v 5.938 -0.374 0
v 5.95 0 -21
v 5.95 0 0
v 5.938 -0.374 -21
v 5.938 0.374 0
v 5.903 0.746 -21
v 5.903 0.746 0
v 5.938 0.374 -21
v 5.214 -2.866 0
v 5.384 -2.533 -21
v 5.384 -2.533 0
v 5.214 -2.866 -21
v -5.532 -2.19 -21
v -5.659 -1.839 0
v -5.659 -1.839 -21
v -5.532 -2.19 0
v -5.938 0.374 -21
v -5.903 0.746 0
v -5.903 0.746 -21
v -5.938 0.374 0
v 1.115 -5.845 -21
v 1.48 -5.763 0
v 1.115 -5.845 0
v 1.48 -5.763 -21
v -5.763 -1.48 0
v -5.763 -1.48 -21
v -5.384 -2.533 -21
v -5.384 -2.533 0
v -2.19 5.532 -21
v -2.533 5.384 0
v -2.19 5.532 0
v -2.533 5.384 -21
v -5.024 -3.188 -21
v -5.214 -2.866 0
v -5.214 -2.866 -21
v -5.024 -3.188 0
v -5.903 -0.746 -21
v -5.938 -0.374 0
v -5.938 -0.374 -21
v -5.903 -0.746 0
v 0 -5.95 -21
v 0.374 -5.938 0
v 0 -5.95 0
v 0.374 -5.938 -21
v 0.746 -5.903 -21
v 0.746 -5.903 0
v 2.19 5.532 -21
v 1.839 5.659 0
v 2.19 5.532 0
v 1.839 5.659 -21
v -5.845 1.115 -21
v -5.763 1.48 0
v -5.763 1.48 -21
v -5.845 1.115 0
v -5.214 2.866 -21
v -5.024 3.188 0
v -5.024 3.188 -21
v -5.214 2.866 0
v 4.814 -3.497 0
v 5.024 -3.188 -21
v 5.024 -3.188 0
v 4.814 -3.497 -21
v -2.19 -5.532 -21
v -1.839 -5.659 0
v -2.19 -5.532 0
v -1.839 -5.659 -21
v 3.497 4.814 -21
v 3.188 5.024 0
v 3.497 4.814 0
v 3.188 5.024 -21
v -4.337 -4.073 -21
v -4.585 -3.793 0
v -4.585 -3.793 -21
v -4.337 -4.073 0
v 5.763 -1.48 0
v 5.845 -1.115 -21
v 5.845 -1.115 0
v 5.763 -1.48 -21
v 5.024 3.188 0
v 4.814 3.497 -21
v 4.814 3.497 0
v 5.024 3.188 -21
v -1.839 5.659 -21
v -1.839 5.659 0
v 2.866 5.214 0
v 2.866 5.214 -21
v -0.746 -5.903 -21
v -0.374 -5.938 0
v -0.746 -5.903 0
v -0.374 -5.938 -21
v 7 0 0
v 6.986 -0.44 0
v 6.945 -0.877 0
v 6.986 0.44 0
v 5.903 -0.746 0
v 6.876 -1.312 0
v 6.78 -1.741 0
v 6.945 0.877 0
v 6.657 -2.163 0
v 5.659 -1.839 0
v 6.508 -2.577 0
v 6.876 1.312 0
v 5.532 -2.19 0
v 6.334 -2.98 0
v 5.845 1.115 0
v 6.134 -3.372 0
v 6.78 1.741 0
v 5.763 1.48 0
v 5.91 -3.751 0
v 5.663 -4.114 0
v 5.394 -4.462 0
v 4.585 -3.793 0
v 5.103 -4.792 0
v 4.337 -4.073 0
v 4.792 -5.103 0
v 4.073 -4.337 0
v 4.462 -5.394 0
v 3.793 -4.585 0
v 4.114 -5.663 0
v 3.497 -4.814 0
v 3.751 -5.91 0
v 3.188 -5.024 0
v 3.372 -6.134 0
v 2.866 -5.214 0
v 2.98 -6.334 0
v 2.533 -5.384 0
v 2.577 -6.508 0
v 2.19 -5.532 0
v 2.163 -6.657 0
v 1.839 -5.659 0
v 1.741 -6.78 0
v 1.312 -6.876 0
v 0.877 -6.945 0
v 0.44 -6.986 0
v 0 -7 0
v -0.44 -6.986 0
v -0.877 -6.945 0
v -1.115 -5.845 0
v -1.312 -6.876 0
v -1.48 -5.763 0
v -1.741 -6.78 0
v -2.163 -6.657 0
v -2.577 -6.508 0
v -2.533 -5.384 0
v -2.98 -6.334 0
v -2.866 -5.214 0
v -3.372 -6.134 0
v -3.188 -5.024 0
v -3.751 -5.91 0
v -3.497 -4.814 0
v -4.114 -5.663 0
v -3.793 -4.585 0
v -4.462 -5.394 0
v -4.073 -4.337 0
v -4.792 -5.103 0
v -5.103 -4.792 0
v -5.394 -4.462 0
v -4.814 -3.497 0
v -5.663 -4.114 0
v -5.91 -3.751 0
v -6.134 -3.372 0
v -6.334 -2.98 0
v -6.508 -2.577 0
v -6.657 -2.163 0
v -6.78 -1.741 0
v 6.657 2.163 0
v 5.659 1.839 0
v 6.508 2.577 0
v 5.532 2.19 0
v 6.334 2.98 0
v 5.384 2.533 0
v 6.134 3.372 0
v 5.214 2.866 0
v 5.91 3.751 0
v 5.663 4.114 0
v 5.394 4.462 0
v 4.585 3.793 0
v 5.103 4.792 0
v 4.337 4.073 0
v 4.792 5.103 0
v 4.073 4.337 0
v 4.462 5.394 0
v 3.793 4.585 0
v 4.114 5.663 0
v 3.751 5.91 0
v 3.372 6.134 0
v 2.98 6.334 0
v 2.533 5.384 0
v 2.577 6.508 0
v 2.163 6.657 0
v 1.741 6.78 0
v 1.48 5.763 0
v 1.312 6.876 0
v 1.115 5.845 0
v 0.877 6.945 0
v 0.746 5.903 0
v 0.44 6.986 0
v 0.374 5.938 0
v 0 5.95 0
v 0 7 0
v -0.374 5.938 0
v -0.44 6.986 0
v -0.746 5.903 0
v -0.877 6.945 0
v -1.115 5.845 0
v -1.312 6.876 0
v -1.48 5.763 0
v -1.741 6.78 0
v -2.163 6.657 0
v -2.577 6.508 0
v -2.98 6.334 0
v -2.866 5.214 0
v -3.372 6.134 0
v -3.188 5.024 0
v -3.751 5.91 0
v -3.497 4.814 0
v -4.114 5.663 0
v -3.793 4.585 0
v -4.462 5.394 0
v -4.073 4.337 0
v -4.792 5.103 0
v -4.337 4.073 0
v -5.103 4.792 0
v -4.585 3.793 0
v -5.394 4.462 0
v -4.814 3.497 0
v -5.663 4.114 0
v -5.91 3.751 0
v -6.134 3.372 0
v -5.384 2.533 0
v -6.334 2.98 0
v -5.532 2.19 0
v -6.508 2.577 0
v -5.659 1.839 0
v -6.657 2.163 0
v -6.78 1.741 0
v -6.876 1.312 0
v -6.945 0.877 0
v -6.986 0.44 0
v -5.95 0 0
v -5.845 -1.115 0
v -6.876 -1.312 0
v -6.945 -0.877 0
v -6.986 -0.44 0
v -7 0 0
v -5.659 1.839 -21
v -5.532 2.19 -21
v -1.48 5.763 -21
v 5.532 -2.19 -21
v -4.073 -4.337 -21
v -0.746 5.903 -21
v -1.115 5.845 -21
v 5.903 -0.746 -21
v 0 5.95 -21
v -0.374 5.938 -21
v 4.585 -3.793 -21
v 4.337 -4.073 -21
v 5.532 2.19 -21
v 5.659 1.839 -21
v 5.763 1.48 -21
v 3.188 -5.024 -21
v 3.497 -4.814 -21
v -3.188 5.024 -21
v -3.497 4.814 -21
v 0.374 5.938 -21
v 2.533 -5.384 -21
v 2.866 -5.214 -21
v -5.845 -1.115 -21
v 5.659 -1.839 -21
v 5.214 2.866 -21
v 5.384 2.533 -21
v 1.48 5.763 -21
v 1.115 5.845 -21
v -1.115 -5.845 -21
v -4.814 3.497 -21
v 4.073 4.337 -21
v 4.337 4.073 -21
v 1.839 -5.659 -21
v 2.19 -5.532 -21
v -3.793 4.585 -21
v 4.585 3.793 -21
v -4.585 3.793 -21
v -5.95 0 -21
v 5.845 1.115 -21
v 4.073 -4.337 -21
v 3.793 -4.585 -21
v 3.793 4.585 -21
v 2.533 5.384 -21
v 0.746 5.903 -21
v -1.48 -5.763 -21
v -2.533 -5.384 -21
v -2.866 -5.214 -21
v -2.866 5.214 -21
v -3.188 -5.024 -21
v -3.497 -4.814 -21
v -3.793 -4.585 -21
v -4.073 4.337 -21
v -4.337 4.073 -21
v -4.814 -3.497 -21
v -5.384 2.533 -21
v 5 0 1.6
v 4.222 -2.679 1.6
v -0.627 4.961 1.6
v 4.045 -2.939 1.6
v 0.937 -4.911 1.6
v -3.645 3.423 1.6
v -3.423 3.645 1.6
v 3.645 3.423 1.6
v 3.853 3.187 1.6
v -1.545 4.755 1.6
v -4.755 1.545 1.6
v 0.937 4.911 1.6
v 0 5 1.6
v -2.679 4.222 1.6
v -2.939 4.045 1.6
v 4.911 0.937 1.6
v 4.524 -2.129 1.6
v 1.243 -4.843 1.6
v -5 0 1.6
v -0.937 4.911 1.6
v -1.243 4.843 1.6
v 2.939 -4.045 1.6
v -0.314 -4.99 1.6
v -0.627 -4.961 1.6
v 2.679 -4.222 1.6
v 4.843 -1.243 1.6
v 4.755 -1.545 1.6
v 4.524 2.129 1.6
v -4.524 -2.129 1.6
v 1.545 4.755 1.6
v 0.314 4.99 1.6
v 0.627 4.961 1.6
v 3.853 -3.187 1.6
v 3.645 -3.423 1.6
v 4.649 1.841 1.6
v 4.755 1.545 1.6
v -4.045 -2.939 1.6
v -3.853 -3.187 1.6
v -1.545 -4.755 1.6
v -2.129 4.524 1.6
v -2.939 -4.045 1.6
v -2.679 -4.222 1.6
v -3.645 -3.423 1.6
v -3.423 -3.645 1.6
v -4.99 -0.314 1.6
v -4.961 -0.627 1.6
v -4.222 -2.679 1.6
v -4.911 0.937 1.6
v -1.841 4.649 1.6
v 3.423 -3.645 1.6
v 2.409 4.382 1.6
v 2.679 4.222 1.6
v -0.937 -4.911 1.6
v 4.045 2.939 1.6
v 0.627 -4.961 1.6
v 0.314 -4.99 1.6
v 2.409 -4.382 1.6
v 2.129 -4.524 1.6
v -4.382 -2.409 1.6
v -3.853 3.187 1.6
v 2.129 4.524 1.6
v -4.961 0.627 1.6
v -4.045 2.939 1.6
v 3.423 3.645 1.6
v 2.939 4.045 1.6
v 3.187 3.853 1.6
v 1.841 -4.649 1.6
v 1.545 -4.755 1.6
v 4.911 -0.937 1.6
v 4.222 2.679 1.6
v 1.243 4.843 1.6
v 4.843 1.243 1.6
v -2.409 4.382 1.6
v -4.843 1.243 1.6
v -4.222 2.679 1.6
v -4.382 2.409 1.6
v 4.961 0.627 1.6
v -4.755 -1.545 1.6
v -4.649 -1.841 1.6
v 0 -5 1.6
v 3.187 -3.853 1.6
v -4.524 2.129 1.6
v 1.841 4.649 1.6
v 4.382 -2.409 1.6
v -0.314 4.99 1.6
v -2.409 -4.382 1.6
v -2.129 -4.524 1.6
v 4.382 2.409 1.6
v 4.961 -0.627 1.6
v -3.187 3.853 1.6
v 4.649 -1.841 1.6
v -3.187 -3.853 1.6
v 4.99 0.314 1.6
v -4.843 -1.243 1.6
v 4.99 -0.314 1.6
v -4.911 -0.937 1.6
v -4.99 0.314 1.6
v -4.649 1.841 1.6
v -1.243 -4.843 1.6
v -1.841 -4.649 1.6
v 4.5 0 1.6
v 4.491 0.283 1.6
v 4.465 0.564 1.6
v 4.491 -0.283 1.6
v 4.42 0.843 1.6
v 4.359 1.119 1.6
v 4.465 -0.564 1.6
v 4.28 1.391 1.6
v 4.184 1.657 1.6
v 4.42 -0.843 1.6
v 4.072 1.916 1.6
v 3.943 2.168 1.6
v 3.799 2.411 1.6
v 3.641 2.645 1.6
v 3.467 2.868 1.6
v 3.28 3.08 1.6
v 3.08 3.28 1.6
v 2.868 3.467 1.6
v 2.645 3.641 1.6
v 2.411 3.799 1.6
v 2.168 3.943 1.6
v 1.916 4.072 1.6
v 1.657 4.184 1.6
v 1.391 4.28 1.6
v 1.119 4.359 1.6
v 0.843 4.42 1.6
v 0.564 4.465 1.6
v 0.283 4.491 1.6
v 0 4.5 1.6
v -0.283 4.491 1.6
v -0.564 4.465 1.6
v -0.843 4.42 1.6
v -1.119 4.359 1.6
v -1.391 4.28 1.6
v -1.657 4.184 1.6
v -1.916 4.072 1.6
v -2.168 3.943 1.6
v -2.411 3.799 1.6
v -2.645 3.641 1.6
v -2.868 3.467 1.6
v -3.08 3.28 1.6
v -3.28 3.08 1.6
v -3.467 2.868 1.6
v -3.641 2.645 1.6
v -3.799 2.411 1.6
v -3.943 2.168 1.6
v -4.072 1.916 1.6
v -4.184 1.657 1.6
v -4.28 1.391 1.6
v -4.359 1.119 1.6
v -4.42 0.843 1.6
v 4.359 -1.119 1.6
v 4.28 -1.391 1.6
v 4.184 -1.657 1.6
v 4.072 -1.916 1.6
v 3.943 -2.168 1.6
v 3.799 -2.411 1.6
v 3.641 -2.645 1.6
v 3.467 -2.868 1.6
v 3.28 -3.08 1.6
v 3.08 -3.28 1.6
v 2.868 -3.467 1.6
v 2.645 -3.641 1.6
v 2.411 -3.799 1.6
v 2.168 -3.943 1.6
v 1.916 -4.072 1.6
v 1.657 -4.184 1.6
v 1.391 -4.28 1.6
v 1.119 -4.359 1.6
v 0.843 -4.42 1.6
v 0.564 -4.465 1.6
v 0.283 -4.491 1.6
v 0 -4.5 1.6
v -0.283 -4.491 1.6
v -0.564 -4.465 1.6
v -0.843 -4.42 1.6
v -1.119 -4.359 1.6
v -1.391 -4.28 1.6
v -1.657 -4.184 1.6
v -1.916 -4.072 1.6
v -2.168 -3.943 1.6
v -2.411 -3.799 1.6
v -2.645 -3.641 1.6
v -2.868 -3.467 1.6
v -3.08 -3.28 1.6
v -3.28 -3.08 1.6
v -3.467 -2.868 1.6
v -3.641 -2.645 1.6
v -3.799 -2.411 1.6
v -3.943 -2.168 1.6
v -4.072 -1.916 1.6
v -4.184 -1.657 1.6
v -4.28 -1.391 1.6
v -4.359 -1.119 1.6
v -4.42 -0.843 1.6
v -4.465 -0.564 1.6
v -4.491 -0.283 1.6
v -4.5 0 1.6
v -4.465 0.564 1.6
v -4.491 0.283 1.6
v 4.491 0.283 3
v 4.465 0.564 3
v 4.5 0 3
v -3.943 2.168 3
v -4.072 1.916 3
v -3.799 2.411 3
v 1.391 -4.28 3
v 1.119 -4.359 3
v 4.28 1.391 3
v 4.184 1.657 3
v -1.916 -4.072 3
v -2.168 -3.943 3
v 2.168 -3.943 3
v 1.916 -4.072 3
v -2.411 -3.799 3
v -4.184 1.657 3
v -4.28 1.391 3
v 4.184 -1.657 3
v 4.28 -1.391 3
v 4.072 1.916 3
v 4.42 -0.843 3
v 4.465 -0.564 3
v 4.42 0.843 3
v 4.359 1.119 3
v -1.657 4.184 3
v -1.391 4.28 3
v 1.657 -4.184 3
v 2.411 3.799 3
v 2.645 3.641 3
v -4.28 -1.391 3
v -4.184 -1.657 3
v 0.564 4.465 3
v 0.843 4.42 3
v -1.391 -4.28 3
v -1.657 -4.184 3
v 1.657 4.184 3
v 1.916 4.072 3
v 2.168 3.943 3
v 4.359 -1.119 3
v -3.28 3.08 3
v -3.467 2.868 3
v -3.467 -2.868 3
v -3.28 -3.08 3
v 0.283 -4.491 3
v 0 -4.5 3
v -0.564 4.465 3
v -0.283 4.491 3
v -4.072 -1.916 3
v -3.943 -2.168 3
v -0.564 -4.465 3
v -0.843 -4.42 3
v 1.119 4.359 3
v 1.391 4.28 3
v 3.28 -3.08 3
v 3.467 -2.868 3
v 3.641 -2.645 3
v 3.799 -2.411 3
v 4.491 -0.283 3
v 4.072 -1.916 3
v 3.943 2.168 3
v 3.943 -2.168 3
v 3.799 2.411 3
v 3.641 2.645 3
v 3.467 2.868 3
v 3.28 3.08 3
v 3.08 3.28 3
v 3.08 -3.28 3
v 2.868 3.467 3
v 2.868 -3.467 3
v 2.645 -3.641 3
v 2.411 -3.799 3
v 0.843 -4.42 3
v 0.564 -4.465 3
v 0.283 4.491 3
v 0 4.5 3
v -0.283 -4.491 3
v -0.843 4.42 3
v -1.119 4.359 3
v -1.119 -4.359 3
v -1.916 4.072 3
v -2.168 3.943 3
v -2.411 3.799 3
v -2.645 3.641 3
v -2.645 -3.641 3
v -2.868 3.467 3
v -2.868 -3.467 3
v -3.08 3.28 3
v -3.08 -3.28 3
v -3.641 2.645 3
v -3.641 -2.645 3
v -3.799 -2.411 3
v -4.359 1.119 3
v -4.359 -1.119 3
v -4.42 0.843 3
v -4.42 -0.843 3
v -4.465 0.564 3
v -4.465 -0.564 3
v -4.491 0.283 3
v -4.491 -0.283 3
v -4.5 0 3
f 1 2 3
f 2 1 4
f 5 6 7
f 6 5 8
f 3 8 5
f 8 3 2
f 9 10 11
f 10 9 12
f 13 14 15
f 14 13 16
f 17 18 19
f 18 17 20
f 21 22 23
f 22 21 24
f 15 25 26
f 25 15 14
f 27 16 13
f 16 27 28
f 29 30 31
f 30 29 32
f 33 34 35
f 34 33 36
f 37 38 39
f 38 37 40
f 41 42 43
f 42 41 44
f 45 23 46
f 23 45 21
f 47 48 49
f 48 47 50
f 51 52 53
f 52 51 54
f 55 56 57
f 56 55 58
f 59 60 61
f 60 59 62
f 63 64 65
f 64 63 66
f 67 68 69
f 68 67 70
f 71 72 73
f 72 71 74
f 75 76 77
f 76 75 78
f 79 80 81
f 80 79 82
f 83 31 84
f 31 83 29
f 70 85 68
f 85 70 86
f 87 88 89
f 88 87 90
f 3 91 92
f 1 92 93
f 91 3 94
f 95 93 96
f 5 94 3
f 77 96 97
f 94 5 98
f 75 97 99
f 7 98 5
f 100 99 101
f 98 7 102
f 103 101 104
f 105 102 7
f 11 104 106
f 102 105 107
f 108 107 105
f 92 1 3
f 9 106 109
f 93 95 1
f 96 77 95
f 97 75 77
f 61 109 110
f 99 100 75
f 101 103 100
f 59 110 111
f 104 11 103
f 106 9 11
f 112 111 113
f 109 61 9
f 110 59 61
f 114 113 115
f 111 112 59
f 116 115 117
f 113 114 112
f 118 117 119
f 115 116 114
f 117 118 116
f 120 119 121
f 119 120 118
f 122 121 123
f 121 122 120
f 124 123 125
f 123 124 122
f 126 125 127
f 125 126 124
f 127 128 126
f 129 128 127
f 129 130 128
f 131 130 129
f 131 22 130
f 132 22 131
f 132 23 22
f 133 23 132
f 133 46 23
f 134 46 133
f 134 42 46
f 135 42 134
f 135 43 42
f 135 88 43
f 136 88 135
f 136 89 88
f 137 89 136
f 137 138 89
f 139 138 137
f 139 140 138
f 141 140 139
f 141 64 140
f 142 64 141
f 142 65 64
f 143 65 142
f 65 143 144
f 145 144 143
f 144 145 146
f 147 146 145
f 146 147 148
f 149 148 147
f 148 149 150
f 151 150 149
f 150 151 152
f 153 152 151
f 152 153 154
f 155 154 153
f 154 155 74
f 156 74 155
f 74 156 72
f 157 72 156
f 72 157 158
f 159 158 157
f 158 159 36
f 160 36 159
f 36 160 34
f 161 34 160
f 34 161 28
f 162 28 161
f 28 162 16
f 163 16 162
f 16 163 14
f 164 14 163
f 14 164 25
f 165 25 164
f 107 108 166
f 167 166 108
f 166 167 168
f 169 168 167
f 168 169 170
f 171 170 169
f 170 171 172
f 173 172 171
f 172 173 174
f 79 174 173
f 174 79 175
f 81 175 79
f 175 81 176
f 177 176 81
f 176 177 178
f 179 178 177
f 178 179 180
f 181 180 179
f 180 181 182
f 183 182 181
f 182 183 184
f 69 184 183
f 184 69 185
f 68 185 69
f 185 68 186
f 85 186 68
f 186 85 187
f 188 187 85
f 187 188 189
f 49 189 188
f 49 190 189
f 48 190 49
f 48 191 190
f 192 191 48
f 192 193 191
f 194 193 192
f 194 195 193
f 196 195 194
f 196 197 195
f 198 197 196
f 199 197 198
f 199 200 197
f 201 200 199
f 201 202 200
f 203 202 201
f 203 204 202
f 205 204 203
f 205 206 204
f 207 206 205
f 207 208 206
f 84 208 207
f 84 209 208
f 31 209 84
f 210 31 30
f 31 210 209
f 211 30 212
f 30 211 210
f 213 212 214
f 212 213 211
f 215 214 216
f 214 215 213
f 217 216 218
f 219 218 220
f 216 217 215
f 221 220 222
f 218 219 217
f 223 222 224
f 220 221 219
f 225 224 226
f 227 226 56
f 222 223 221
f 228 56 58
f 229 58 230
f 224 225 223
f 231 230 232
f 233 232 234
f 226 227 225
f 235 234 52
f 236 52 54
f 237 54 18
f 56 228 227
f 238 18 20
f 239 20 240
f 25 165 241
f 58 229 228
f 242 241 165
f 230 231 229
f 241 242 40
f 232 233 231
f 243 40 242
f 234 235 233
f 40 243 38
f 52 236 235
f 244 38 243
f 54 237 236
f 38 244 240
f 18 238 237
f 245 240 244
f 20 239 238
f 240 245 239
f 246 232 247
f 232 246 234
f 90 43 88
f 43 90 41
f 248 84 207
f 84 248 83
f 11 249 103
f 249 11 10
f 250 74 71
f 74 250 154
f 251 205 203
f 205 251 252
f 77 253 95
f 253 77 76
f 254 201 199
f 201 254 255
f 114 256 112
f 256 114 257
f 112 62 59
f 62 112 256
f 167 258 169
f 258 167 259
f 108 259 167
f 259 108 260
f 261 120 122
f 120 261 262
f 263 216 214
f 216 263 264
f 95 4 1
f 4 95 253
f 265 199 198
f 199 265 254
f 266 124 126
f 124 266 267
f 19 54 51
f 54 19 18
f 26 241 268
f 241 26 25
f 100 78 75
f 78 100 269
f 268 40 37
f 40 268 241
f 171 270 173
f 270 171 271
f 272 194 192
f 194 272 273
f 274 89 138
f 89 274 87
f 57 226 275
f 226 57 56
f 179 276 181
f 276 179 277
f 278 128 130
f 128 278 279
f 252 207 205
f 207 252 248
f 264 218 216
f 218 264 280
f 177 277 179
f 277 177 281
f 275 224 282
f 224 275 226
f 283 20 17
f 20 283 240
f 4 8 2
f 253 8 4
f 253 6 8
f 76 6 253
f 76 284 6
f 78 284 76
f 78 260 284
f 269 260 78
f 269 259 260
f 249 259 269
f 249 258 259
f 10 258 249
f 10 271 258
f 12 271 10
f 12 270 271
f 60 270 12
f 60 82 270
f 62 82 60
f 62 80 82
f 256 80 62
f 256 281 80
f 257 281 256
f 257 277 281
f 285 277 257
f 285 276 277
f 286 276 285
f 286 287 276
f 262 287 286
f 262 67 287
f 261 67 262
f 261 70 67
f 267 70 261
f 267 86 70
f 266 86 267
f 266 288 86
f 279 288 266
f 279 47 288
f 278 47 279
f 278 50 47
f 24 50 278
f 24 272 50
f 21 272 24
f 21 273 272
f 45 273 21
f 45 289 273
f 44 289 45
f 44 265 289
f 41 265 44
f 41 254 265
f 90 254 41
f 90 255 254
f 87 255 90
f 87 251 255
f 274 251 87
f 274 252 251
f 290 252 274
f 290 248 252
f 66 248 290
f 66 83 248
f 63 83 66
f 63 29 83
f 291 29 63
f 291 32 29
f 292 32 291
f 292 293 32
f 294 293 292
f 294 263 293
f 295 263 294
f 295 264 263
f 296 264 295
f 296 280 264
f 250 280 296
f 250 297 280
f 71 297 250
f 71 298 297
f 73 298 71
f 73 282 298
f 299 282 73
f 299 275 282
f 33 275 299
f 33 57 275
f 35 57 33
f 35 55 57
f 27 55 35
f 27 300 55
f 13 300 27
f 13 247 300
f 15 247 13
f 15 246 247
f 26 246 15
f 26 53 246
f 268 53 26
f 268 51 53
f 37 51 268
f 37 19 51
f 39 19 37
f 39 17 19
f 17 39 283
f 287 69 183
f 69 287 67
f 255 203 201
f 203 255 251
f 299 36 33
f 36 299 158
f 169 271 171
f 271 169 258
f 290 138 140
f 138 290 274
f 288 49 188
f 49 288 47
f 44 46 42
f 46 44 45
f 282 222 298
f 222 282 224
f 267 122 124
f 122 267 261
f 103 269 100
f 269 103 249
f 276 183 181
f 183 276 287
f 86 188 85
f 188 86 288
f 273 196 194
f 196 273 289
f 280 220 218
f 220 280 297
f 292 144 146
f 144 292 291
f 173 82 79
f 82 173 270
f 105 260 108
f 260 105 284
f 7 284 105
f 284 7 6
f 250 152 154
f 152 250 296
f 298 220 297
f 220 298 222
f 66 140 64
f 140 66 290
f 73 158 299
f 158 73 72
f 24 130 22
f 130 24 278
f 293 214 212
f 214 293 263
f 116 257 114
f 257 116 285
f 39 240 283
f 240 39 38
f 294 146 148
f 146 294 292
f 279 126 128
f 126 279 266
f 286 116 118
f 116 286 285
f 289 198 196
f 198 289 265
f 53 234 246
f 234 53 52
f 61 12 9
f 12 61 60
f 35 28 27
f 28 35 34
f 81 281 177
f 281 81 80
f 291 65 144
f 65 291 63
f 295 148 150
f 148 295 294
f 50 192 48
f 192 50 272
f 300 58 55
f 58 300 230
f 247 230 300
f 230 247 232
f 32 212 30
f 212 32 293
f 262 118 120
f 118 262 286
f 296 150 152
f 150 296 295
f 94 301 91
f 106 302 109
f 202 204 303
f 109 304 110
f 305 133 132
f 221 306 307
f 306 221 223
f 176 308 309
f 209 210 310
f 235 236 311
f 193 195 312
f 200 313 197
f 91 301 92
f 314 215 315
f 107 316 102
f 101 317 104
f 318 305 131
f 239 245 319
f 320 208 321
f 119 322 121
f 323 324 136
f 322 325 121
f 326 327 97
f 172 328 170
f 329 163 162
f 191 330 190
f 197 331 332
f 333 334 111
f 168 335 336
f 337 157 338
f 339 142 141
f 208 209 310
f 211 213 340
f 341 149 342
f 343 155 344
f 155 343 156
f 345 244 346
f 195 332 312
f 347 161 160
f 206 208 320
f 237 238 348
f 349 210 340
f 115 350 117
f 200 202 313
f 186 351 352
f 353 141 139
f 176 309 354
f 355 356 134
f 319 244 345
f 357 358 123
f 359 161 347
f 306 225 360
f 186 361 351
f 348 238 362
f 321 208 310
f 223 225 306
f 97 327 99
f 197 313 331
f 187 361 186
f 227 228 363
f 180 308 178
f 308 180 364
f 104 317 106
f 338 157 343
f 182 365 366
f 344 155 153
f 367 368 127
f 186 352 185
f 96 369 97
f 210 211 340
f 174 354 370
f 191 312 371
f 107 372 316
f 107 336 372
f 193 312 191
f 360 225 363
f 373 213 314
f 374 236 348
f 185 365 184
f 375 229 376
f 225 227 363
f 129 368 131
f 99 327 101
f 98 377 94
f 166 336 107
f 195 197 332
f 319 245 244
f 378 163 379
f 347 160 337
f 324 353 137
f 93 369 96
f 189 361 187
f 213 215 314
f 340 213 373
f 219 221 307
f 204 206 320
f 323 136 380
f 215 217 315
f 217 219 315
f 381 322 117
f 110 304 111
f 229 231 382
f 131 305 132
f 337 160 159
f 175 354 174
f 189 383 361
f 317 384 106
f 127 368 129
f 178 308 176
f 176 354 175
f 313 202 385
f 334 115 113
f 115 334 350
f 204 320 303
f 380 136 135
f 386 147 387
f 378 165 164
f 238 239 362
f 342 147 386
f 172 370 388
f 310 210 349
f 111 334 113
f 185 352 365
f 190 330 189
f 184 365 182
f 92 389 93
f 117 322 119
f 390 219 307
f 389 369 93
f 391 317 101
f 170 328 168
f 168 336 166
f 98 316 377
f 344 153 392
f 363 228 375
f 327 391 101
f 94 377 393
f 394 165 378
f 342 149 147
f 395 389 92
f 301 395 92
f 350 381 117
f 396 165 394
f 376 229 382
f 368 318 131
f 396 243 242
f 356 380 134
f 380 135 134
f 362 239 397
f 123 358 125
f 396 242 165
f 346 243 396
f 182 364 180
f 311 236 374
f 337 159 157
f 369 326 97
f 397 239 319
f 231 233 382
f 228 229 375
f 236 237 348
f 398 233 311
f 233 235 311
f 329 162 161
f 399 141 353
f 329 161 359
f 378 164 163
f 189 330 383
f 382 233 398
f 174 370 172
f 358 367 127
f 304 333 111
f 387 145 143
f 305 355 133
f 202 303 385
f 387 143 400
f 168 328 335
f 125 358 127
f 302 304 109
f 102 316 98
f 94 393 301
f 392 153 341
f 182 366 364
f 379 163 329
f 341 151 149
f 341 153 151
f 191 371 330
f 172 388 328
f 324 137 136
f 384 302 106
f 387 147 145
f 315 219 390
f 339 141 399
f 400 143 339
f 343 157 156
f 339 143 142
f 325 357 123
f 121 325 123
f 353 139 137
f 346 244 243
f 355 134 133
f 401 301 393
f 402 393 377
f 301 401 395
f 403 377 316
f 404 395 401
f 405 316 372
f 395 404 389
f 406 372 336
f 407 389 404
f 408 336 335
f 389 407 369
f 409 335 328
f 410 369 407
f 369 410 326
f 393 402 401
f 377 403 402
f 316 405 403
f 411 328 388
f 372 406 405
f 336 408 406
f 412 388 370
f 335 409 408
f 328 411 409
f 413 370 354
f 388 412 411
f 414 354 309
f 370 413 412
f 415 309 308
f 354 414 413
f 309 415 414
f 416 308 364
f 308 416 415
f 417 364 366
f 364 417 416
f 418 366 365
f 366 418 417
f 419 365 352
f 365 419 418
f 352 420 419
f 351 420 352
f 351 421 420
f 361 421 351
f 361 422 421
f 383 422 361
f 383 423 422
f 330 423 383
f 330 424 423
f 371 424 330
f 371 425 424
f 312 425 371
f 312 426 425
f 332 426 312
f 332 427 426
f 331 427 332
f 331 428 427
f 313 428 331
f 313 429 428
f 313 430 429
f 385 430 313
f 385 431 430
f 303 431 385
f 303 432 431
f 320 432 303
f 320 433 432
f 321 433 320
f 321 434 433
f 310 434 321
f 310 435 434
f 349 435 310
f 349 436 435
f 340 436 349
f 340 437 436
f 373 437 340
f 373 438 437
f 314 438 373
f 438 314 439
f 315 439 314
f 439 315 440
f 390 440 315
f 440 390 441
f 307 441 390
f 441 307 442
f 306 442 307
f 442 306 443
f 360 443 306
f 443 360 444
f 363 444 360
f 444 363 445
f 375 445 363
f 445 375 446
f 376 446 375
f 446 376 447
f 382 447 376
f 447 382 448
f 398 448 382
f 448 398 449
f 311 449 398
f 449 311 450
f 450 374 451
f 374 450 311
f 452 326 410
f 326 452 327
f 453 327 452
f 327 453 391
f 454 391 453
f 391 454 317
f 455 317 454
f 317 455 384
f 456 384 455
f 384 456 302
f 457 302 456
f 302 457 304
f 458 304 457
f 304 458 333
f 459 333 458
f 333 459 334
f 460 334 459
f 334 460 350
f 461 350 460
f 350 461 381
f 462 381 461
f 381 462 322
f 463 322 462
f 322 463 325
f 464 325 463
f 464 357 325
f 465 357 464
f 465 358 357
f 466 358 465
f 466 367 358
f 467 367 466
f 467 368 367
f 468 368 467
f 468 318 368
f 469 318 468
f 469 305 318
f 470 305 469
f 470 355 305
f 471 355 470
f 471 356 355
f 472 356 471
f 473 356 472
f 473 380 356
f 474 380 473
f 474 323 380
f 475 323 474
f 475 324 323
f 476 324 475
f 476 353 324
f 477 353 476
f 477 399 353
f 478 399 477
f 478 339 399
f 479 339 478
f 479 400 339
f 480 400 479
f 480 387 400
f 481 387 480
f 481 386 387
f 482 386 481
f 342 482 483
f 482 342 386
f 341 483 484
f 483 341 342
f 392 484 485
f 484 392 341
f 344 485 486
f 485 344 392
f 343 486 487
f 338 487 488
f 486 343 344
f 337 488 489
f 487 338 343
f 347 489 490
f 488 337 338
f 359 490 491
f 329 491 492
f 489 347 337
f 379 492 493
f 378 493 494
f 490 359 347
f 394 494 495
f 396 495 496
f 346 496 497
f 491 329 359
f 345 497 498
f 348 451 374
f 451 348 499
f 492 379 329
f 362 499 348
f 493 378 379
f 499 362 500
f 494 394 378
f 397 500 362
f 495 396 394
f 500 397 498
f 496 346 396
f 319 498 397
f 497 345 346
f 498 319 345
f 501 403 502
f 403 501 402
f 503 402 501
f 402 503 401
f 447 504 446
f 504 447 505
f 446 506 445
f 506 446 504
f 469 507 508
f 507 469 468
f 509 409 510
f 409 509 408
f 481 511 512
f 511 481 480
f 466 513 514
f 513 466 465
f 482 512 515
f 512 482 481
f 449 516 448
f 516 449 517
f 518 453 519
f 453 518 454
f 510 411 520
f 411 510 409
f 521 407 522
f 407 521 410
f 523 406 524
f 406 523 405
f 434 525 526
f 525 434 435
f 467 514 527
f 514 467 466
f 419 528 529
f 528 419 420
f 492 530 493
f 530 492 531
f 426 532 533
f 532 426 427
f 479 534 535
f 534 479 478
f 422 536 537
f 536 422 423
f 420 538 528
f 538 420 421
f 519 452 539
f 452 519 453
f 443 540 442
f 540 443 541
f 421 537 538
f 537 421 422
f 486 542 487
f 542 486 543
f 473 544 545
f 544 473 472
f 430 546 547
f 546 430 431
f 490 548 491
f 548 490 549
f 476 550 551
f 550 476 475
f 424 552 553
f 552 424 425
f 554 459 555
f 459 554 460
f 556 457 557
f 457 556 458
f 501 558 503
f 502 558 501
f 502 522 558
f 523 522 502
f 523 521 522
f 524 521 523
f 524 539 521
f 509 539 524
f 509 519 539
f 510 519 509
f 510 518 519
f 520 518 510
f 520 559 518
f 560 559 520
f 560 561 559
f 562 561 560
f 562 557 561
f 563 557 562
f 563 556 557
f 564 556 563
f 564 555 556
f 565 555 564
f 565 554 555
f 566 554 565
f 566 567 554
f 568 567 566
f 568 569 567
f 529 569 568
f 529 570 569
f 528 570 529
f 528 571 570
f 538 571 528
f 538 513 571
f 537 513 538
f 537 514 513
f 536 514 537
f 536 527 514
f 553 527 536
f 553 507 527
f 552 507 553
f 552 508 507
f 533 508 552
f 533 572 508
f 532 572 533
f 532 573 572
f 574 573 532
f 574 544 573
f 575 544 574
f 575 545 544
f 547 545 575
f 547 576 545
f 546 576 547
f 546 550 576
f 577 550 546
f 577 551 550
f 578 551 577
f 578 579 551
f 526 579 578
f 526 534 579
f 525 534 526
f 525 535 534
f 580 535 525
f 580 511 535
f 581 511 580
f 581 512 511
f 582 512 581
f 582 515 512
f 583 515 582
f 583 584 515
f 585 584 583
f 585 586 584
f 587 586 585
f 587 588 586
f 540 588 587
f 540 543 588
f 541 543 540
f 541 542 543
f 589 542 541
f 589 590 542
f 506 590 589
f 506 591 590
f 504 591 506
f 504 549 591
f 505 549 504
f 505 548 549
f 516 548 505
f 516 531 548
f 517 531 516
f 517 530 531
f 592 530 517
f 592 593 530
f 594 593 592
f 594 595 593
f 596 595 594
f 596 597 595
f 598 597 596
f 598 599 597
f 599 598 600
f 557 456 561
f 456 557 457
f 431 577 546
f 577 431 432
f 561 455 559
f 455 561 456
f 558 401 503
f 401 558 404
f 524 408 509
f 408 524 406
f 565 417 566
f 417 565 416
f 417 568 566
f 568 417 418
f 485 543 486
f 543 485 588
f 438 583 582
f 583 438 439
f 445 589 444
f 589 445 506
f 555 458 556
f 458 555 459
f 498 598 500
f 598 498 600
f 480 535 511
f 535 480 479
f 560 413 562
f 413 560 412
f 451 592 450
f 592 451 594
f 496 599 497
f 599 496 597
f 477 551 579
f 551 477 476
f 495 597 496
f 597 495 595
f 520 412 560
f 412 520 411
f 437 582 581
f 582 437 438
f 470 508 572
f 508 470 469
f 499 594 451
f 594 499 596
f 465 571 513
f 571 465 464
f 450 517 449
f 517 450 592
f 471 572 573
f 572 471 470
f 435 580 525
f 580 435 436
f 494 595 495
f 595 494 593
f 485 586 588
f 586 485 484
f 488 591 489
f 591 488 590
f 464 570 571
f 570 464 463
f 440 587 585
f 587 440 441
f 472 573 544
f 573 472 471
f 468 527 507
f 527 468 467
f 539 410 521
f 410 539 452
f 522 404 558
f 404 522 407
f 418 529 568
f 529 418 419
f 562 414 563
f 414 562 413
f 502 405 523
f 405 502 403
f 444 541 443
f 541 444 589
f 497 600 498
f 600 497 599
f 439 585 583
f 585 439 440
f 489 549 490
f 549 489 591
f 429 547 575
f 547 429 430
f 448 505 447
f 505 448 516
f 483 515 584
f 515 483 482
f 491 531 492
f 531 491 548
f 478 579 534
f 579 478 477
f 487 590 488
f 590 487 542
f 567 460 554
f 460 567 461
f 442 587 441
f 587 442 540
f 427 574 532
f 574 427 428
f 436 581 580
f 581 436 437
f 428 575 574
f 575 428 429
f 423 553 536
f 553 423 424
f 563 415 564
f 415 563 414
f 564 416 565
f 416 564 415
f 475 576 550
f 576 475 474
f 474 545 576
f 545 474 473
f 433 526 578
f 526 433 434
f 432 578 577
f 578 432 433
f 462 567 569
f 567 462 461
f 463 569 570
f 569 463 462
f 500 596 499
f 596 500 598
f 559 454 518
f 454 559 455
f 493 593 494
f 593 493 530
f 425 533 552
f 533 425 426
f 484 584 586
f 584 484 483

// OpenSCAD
/**
 * onOffButton
 * @name onOffButton
 * @description Simple On Off button
 * @type asset
 * @parent 
 */
module onOffButton(
    $fn = 100
) {

    bottom_part_z_size = 6 + 12 + (6 / 2);
    bottom_part_diameter = 11.90; // M12 * 0.75

    support_z_size = 1.6;
    support_diameter_1 = 14;
    support_diameter_2 = 9 + 1;

    button_z_size = 3;
    button_diameter = 9;

    translate([0, 0, -bottom_part_z_size])
        cylinder(h=bottom_part_z_size, d=bottom_part_diameter, $fn = $fn);

    cylinder(
        h = support_z_size,
        d1 = support_diameter_1,
        d2 = support_diameter_2,
        $fn = $fn
    );

    cylinder(
        h = button_z_size,
        d = button_diameter,
        $fn = $fn
    );
}

onOffButton();
